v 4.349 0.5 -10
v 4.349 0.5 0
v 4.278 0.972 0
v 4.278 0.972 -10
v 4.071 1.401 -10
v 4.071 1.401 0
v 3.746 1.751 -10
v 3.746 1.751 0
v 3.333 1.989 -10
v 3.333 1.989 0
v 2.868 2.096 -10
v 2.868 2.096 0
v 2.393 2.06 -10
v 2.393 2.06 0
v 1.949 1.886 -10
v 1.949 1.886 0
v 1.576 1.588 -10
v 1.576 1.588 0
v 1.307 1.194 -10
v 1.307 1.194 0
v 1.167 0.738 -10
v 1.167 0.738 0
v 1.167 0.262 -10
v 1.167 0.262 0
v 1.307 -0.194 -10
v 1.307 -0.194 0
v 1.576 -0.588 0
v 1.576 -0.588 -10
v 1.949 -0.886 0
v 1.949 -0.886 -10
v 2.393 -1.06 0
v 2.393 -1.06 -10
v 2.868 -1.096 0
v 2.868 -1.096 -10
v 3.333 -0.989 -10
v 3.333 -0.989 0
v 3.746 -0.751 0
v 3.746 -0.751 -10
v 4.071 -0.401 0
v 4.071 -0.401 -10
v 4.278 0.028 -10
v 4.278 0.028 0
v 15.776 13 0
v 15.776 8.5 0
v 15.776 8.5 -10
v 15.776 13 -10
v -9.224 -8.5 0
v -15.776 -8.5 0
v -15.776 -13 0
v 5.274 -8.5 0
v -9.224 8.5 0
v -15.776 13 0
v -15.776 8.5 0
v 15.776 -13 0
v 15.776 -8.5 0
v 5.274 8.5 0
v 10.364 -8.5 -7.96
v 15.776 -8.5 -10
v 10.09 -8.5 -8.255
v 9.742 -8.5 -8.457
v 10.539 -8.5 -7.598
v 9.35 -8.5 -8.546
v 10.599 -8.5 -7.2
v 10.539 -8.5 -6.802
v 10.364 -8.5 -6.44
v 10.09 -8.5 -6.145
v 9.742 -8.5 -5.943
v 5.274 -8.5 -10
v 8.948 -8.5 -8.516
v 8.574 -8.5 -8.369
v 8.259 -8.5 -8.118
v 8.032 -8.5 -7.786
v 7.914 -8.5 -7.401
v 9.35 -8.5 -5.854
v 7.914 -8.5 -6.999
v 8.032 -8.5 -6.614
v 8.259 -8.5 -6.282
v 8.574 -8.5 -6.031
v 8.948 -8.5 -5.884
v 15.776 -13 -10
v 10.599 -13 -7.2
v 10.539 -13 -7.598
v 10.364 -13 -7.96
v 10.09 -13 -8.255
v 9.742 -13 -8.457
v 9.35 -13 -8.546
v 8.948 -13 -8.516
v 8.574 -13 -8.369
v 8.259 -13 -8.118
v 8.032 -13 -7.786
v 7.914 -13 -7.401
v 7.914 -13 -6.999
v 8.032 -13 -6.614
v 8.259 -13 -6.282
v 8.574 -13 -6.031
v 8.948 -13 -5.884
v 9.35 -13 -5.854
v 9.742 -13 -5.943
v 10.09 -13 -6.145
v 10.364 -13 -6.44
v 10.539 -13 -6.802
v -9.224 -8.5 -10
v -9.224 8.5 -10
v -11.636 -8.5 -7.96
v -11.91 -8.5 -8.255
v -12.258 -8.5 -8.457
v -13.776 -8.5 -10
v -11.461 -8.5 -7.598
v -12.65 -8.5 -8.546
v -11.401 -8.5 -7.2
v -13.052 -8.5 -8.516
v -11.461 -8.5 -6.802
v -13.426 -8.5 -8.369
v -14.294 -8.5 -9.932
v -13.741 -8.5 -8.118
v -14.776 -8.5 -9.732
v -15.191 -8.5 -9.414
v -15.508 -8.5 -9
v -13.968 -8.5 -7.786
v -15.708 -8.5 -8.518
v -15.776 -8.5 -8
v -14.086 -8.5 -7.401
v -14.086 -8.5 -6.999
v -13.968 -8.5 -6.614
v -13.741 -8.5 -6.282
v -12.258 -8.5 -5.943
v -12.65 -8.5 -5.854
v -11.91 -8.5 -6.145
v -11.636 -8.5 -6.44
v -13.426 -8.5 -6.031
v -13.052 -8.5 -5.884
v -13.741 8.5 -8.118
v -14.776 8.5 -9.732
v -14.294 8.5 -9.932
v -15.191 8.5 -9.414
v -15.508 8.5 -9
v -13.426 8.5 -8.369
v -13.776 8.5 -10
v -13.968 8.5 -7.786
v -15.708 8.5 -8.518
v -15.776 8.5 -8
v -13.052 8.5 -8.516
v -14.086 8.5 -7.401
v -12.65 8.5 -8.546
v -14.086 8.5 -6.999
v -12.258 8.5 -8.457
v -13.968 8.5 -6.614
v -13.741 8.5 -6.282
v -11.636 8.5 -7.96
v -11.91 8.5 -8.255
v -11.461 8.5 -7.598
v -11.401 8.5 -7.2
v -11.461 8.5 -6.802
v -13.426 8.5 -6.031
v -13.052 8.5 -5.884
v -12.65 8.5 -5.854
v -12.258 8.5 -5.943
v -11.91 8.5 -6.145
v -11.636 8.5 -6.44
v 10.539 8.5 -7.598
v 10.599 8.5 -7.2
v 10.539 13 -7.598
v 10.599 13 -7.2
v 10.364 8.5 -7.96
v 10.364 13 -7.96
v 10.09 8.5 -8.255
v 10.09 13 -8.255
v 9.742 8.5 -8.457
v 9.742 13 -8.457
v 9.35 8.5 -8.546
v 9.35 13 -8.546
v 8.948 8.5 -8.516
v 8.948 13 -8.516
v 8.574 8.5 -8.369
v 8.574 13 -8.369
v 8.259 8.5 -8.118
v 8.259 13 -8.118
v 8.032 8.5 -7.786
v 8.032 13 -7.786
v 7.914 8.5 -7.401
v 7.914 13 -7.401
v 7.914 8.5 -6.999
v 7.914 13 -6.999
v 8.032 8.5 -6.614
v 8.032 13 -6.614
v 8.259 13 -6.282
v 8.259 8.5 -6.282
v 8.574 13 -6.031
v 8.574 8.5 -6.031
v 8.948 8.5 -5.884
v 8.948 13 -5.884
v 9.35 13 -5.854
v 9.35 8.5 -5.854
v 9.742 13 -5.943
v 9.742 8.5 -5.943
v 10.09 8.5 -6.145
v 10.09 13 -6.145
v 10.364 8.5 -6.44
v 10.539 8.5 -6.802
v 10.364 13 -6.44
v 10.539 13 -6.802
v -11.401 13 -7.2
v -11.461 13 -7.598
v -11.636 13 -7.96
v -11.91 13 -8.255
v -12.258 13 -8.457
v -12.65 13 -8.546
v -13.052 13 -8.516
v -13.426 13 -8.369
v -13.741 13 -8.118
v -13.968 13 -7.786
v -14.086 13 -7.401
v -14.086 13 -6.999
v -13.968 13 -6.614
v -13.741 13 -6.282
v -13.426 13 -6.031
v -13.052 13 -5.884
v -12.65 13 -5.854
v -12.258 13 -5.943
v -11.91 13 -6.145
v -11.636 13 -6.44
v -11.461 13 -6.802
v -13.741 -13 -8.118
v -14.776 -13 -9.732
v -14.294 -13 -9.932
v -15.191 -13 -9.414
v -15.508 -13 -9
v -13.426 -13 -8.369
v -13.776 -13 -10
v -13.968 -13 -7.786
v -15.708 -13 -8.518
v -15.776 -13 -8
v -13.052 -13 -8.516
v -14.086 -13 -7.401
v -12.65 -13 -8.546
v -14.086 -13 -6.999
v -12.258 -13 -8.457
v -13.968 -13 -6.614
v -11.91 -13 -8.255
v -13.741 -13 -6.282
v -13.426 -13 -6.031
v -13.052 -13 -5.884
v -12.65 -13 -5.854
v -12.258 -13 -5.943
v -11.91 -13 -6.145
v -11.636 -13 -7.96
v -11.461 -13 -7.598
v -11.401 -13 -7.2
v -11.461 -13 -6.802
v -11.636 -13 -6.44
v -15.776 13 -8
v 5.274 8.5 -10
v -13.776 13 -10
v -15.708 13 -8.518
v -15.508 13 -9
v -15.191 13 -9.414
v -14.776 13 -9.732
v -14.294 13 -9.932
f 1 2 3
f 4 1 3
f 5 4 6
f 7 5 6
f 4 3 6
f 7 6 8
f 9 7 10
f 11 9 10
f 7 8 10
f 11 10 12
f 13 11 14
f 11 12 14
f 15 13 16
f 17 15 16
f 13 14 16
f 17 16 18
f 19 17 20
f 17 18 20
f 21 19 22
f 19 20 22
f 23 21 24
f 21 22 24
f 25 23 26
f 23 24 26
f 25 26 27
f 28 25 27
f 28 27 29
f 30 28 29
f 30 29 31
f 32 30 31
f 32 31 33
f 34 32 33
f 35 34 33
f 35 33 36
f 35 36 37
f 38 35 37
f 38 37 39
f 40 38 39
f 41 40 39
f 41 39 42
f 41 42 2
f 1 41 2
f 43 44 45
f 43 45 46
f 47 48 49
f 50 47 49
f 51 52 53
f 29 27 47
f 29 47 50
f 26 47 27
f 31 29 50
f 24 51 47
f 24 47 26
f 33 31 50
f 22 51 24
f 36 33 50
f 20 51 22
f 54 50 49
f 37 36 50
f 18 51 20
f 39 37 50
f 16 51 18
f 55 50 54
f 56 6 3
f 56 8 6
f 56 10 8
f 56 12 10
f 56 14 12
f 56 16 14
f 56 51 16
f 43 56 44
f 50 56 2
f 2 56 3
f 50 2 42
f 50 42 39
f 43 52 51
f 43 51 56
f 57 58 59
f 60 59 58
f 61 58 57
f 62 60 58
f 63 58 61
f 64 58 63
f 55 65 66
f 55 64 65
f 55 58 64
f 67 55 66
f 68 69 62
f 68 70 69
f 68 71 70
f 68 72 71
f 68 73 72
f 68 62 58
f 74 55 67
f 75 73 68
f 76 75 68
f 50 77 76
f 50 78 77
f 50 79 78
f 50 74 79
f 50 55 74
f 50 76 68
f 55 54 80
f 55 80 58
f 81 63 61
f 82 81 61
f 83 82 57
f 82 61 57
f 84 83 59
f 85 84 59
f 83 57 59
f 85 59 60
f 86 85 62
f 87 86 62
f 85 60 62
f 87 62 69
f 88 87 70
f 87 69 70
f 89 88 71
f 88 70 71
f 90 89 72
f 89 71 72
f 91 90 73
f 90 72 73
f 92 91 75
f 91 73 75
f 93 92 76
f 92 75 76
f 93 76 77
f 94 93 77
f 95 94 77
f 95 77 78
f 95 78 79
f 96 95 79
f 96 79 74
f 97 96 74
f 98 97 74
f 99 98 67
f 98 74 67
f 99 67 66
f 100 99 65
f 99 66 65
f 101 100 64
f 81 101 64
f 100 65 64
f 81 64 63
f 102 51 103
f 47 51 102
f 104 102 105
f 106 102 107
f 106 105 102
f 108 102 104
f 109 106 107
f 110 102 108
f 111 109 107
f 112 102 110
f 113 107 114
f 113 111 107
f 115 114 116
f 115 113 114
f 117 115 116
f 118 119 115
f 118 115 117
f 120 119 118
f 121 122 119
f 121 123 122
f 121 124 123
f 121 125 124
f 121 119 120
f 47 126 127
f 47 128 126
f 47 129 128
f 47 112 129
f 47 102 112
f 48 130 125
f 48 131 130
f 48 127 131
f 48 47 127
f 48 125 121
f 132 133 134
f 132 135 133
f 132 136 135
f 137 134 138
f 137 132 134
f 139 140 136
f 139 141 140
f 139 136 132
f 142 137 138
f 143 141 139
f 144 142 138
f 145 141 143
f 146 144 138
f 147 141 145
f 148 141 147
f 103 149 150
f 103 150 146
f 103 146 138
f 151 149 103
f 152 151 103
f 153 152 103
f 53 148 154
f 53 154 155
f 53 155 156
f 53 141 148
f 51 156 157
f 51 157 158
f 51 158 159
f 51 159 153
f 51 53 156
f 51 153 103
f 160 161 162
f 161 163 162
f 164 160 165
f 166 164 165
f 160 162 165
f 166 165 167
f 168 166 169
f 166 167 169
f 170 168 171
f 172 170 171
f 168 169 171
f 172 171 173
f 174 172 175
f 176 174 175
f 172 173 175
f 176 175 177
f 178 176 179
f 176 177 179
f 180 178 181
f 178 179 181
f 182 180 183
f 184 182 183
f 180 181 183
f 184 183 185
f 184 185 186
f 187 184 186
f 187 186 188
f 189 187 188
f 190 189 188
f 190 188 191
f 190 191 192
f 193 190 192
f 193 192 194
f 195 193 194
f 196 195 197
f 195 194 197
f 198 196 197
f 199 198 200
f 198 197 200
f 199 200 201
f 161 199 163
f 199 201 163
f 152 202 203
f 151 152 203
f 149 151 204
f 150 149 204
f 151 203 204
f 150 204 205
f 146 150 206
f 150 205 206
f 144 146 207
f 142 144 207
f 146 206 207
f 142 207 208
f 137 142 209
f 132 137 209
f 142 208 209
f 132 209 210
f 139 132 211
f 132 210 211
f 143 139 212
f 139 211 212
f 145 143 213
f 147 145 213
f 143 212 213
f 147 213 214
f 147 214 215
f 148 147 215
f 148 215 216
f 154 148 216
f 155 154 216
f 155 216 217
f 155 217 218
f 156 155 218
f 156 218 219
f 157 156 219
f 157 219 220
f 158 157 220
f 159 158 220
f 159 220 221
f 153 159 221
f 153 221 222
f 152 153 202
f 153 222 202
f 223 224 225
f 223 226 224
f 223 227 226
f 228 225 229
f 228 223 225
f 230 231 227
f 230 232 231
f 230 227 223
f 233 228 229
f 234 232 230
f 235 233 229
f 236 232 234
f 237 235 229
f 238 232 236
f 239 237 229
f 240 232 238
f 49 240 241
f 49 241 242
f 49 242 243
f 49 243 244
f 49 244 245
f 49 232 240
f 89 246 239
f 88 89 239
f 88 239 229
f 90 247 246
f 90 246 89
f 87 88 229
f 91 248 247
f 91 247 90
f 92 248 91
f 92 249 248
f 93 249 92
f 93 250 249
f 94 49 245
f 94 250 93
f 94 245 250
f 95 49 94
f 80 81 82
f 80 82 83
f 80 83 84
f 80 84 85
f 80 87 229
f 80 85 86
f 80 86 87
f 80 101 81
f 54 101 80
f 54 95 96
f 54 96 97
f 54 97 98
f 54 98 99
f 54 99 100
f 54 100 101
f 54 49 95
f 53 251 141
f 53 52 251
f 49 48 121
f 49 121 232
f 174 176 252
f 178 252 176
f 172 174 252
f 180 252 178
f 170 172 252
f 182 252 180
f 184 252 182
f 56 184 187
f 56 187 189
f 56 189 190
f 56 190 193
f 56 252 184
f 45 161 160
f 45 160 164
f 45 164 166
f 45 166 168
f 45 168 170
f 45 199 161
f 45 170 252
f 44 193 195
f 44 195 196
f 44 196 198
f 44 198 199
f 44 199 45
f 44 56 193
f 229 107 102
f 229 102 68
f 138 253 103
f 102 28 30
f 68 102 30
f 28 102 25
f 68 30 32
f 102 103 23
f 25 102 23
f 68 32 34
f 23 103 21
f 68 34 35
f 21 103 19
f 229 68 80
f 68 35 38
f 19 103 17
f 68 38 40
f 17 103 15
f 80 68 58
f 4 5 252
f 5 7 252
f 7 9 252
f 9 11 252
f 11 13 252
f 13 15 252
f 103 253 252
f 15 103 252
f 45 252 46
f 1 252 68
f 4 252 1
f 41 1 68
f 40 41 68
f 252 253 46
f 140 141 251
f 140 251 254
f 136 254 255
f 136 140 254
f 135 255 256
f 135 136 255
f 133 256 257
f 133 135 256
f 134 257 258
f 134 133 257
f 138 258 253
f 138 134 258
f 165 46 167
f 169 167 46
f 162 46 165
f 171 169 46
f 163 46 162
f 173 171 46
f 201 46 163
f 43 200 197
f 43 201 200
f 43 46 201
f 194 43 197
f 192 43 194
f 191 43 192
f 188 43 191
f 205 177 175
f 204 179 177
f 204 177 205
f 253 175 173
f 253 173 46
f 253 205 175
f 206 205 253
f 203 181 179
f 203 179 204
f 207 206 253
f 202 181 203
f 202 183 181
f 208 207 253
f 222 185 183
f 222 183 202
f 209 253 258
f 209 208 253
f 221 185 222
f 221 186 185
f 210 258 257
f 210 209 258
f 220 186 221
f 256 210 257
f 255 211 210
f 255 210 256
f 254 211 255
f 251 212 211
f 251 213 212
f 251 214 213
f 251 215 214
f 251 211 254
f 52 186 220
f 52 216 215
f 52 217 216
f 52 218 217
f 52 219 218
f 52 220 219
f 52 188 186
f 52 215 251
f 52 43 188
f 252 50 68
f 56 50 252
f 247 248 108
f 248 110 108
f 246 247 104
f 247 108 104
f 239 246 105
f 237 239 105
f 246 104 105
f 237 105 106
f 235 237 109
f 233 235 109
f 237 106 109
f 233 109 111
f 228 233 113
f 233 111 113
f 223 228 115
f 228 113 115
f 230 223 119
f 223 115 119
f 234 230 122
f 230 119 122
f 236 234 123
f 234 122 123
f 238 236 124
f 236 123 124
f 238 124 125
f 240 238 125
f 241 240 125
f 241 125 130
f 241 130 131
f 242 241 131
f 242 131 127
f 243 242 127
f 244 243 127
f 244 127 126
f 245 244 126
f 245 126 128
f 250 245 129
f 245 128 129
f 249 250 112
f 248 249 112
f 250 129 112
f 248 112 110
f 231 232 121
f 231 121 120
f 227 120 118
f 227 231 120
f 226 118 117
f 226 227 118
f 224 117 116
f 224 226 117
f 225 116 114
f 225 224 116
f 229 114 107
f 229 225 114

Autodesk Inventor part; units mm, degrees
ref_plane "YZ Plane" through (0, 0, 0) normal (1, 0, 0) x (0, 1, 0)
ref_plane "XZ Plane" through (0, 0, 0) normal (0, 1, 0) x (-1, 0, 0)
ref_plane "XY Plane" through (0, 0, 0) normal (0, 0, 1) x (1, 0, 0)
ref_plane "작업 평면4" through (0, 0, 0) normal (0, 0, 1) x (1, 0, 0)
sketch "스케치5" plane through (0, 0, 0) normal (0, 0, 1) x (1, 0, 0)
  line L0 (-9.2237, 8.5) -> (-9.2237, -8.5) projected
  line L1 (-9.2237, -8.5) -> (-15.7763, -8.5) projected
  line L2 (-15.7763, -8.5) -> (-15.7763, -13) projected
  line L3 (-15.7763, -13) -> (15.7763, -13) projected
  line L4 (15.7763, -13) -> (15.7763, -8.5) projected
  line L5 (15.7763, -8.5) -> (5.2737, -8.5) projected
  line L6 (5.2737, -8.5) -> (5.2737, 8.5) projected
  line L7 (5.2737, 8.5) -> (15.7763, 8.5) projected
  line L8 (15.7763, 8.5) -> (15.7763, 13) projected
  line L9 (15.7763, 13) -> (-15.7763, 13) projected
  line L10 (-15.7763, 13) -> (-15.7763, 8.5) projected
  line L11 (-15.7763, 8.5) -> (-9.2237, 8.5) projected
  circle A0 centre (2.7487, 0.5) radius 1.6 projected
  line L12 (15.7763, 13) -> (-15.7763, 13)
  line L13 (-15.7763, 13) -> (-15.7763, 8.5)
  line L14 (-15.7763, 8.5) -> (15.7763, 8.5)
  line L15 (15.7763, 8.5) -> (15.7763, 13)
  line L16 (5.2737, 8.5) -> (-9.2237, 8.5)
  line L17 (-9.2237, 8.5) -> (-9.2237, -8.5)
  line L18 (-9.2237, -8.5) -> (5.2737, -8.5)
  line L19 (5.2737, -8.5) -> (5.2737, 8.5)
  line L20 (15.7763, -8.5) -> (-15.7763, -8.5)
  line L21 (-15.7763, -8.5) -> (-15.7763, -13)
  line L22 (-15.7763, -13) -> (15.7763, -13)
  line L23 (15.7763, -13) -> (15.7763, -8.5)
  point P0 (0, 0)
extrude "돌출1" add sketch "스케치5" against normal blind 10
sketch "스케치6" plane through (-15.7763, 13, 0) normal (0, 1, 0) x (1, 0, 0)
  arc A0 (2, 10) -> (0, 8) centre (2, 8) ccw projected
  line L0 (0, 8) -> (0, 0) projected
  line L1 (31.5525, 0) -> (0, 0) projected
  line L2 (31.5525, 10) -> (31.5525, 0) projected
  line L3 (31.5525, 10) -> (2, 10) projected
  circle A1 centre (3.025, 7.2) radius 1.35 projected
  circle A2 centre (25.025, 7.2) radius 1.35 projected
  circle A3 centre (25.025, 7.2) radius 1.35
  circle A4 centre (3.025, 7.2) radius 1.35
  point P0 (15.7763, 0)
extrude "돌출2" cut sketch "스케치6" against normal through all contours A1 | A2
fillet "모깎기1" radius 2 2 edges at (-15.7763, 10.75, -10) (-15.7763, -10.75, -10)
properties part number "front ankle connection_right" material "PMMA 플라스틱"
